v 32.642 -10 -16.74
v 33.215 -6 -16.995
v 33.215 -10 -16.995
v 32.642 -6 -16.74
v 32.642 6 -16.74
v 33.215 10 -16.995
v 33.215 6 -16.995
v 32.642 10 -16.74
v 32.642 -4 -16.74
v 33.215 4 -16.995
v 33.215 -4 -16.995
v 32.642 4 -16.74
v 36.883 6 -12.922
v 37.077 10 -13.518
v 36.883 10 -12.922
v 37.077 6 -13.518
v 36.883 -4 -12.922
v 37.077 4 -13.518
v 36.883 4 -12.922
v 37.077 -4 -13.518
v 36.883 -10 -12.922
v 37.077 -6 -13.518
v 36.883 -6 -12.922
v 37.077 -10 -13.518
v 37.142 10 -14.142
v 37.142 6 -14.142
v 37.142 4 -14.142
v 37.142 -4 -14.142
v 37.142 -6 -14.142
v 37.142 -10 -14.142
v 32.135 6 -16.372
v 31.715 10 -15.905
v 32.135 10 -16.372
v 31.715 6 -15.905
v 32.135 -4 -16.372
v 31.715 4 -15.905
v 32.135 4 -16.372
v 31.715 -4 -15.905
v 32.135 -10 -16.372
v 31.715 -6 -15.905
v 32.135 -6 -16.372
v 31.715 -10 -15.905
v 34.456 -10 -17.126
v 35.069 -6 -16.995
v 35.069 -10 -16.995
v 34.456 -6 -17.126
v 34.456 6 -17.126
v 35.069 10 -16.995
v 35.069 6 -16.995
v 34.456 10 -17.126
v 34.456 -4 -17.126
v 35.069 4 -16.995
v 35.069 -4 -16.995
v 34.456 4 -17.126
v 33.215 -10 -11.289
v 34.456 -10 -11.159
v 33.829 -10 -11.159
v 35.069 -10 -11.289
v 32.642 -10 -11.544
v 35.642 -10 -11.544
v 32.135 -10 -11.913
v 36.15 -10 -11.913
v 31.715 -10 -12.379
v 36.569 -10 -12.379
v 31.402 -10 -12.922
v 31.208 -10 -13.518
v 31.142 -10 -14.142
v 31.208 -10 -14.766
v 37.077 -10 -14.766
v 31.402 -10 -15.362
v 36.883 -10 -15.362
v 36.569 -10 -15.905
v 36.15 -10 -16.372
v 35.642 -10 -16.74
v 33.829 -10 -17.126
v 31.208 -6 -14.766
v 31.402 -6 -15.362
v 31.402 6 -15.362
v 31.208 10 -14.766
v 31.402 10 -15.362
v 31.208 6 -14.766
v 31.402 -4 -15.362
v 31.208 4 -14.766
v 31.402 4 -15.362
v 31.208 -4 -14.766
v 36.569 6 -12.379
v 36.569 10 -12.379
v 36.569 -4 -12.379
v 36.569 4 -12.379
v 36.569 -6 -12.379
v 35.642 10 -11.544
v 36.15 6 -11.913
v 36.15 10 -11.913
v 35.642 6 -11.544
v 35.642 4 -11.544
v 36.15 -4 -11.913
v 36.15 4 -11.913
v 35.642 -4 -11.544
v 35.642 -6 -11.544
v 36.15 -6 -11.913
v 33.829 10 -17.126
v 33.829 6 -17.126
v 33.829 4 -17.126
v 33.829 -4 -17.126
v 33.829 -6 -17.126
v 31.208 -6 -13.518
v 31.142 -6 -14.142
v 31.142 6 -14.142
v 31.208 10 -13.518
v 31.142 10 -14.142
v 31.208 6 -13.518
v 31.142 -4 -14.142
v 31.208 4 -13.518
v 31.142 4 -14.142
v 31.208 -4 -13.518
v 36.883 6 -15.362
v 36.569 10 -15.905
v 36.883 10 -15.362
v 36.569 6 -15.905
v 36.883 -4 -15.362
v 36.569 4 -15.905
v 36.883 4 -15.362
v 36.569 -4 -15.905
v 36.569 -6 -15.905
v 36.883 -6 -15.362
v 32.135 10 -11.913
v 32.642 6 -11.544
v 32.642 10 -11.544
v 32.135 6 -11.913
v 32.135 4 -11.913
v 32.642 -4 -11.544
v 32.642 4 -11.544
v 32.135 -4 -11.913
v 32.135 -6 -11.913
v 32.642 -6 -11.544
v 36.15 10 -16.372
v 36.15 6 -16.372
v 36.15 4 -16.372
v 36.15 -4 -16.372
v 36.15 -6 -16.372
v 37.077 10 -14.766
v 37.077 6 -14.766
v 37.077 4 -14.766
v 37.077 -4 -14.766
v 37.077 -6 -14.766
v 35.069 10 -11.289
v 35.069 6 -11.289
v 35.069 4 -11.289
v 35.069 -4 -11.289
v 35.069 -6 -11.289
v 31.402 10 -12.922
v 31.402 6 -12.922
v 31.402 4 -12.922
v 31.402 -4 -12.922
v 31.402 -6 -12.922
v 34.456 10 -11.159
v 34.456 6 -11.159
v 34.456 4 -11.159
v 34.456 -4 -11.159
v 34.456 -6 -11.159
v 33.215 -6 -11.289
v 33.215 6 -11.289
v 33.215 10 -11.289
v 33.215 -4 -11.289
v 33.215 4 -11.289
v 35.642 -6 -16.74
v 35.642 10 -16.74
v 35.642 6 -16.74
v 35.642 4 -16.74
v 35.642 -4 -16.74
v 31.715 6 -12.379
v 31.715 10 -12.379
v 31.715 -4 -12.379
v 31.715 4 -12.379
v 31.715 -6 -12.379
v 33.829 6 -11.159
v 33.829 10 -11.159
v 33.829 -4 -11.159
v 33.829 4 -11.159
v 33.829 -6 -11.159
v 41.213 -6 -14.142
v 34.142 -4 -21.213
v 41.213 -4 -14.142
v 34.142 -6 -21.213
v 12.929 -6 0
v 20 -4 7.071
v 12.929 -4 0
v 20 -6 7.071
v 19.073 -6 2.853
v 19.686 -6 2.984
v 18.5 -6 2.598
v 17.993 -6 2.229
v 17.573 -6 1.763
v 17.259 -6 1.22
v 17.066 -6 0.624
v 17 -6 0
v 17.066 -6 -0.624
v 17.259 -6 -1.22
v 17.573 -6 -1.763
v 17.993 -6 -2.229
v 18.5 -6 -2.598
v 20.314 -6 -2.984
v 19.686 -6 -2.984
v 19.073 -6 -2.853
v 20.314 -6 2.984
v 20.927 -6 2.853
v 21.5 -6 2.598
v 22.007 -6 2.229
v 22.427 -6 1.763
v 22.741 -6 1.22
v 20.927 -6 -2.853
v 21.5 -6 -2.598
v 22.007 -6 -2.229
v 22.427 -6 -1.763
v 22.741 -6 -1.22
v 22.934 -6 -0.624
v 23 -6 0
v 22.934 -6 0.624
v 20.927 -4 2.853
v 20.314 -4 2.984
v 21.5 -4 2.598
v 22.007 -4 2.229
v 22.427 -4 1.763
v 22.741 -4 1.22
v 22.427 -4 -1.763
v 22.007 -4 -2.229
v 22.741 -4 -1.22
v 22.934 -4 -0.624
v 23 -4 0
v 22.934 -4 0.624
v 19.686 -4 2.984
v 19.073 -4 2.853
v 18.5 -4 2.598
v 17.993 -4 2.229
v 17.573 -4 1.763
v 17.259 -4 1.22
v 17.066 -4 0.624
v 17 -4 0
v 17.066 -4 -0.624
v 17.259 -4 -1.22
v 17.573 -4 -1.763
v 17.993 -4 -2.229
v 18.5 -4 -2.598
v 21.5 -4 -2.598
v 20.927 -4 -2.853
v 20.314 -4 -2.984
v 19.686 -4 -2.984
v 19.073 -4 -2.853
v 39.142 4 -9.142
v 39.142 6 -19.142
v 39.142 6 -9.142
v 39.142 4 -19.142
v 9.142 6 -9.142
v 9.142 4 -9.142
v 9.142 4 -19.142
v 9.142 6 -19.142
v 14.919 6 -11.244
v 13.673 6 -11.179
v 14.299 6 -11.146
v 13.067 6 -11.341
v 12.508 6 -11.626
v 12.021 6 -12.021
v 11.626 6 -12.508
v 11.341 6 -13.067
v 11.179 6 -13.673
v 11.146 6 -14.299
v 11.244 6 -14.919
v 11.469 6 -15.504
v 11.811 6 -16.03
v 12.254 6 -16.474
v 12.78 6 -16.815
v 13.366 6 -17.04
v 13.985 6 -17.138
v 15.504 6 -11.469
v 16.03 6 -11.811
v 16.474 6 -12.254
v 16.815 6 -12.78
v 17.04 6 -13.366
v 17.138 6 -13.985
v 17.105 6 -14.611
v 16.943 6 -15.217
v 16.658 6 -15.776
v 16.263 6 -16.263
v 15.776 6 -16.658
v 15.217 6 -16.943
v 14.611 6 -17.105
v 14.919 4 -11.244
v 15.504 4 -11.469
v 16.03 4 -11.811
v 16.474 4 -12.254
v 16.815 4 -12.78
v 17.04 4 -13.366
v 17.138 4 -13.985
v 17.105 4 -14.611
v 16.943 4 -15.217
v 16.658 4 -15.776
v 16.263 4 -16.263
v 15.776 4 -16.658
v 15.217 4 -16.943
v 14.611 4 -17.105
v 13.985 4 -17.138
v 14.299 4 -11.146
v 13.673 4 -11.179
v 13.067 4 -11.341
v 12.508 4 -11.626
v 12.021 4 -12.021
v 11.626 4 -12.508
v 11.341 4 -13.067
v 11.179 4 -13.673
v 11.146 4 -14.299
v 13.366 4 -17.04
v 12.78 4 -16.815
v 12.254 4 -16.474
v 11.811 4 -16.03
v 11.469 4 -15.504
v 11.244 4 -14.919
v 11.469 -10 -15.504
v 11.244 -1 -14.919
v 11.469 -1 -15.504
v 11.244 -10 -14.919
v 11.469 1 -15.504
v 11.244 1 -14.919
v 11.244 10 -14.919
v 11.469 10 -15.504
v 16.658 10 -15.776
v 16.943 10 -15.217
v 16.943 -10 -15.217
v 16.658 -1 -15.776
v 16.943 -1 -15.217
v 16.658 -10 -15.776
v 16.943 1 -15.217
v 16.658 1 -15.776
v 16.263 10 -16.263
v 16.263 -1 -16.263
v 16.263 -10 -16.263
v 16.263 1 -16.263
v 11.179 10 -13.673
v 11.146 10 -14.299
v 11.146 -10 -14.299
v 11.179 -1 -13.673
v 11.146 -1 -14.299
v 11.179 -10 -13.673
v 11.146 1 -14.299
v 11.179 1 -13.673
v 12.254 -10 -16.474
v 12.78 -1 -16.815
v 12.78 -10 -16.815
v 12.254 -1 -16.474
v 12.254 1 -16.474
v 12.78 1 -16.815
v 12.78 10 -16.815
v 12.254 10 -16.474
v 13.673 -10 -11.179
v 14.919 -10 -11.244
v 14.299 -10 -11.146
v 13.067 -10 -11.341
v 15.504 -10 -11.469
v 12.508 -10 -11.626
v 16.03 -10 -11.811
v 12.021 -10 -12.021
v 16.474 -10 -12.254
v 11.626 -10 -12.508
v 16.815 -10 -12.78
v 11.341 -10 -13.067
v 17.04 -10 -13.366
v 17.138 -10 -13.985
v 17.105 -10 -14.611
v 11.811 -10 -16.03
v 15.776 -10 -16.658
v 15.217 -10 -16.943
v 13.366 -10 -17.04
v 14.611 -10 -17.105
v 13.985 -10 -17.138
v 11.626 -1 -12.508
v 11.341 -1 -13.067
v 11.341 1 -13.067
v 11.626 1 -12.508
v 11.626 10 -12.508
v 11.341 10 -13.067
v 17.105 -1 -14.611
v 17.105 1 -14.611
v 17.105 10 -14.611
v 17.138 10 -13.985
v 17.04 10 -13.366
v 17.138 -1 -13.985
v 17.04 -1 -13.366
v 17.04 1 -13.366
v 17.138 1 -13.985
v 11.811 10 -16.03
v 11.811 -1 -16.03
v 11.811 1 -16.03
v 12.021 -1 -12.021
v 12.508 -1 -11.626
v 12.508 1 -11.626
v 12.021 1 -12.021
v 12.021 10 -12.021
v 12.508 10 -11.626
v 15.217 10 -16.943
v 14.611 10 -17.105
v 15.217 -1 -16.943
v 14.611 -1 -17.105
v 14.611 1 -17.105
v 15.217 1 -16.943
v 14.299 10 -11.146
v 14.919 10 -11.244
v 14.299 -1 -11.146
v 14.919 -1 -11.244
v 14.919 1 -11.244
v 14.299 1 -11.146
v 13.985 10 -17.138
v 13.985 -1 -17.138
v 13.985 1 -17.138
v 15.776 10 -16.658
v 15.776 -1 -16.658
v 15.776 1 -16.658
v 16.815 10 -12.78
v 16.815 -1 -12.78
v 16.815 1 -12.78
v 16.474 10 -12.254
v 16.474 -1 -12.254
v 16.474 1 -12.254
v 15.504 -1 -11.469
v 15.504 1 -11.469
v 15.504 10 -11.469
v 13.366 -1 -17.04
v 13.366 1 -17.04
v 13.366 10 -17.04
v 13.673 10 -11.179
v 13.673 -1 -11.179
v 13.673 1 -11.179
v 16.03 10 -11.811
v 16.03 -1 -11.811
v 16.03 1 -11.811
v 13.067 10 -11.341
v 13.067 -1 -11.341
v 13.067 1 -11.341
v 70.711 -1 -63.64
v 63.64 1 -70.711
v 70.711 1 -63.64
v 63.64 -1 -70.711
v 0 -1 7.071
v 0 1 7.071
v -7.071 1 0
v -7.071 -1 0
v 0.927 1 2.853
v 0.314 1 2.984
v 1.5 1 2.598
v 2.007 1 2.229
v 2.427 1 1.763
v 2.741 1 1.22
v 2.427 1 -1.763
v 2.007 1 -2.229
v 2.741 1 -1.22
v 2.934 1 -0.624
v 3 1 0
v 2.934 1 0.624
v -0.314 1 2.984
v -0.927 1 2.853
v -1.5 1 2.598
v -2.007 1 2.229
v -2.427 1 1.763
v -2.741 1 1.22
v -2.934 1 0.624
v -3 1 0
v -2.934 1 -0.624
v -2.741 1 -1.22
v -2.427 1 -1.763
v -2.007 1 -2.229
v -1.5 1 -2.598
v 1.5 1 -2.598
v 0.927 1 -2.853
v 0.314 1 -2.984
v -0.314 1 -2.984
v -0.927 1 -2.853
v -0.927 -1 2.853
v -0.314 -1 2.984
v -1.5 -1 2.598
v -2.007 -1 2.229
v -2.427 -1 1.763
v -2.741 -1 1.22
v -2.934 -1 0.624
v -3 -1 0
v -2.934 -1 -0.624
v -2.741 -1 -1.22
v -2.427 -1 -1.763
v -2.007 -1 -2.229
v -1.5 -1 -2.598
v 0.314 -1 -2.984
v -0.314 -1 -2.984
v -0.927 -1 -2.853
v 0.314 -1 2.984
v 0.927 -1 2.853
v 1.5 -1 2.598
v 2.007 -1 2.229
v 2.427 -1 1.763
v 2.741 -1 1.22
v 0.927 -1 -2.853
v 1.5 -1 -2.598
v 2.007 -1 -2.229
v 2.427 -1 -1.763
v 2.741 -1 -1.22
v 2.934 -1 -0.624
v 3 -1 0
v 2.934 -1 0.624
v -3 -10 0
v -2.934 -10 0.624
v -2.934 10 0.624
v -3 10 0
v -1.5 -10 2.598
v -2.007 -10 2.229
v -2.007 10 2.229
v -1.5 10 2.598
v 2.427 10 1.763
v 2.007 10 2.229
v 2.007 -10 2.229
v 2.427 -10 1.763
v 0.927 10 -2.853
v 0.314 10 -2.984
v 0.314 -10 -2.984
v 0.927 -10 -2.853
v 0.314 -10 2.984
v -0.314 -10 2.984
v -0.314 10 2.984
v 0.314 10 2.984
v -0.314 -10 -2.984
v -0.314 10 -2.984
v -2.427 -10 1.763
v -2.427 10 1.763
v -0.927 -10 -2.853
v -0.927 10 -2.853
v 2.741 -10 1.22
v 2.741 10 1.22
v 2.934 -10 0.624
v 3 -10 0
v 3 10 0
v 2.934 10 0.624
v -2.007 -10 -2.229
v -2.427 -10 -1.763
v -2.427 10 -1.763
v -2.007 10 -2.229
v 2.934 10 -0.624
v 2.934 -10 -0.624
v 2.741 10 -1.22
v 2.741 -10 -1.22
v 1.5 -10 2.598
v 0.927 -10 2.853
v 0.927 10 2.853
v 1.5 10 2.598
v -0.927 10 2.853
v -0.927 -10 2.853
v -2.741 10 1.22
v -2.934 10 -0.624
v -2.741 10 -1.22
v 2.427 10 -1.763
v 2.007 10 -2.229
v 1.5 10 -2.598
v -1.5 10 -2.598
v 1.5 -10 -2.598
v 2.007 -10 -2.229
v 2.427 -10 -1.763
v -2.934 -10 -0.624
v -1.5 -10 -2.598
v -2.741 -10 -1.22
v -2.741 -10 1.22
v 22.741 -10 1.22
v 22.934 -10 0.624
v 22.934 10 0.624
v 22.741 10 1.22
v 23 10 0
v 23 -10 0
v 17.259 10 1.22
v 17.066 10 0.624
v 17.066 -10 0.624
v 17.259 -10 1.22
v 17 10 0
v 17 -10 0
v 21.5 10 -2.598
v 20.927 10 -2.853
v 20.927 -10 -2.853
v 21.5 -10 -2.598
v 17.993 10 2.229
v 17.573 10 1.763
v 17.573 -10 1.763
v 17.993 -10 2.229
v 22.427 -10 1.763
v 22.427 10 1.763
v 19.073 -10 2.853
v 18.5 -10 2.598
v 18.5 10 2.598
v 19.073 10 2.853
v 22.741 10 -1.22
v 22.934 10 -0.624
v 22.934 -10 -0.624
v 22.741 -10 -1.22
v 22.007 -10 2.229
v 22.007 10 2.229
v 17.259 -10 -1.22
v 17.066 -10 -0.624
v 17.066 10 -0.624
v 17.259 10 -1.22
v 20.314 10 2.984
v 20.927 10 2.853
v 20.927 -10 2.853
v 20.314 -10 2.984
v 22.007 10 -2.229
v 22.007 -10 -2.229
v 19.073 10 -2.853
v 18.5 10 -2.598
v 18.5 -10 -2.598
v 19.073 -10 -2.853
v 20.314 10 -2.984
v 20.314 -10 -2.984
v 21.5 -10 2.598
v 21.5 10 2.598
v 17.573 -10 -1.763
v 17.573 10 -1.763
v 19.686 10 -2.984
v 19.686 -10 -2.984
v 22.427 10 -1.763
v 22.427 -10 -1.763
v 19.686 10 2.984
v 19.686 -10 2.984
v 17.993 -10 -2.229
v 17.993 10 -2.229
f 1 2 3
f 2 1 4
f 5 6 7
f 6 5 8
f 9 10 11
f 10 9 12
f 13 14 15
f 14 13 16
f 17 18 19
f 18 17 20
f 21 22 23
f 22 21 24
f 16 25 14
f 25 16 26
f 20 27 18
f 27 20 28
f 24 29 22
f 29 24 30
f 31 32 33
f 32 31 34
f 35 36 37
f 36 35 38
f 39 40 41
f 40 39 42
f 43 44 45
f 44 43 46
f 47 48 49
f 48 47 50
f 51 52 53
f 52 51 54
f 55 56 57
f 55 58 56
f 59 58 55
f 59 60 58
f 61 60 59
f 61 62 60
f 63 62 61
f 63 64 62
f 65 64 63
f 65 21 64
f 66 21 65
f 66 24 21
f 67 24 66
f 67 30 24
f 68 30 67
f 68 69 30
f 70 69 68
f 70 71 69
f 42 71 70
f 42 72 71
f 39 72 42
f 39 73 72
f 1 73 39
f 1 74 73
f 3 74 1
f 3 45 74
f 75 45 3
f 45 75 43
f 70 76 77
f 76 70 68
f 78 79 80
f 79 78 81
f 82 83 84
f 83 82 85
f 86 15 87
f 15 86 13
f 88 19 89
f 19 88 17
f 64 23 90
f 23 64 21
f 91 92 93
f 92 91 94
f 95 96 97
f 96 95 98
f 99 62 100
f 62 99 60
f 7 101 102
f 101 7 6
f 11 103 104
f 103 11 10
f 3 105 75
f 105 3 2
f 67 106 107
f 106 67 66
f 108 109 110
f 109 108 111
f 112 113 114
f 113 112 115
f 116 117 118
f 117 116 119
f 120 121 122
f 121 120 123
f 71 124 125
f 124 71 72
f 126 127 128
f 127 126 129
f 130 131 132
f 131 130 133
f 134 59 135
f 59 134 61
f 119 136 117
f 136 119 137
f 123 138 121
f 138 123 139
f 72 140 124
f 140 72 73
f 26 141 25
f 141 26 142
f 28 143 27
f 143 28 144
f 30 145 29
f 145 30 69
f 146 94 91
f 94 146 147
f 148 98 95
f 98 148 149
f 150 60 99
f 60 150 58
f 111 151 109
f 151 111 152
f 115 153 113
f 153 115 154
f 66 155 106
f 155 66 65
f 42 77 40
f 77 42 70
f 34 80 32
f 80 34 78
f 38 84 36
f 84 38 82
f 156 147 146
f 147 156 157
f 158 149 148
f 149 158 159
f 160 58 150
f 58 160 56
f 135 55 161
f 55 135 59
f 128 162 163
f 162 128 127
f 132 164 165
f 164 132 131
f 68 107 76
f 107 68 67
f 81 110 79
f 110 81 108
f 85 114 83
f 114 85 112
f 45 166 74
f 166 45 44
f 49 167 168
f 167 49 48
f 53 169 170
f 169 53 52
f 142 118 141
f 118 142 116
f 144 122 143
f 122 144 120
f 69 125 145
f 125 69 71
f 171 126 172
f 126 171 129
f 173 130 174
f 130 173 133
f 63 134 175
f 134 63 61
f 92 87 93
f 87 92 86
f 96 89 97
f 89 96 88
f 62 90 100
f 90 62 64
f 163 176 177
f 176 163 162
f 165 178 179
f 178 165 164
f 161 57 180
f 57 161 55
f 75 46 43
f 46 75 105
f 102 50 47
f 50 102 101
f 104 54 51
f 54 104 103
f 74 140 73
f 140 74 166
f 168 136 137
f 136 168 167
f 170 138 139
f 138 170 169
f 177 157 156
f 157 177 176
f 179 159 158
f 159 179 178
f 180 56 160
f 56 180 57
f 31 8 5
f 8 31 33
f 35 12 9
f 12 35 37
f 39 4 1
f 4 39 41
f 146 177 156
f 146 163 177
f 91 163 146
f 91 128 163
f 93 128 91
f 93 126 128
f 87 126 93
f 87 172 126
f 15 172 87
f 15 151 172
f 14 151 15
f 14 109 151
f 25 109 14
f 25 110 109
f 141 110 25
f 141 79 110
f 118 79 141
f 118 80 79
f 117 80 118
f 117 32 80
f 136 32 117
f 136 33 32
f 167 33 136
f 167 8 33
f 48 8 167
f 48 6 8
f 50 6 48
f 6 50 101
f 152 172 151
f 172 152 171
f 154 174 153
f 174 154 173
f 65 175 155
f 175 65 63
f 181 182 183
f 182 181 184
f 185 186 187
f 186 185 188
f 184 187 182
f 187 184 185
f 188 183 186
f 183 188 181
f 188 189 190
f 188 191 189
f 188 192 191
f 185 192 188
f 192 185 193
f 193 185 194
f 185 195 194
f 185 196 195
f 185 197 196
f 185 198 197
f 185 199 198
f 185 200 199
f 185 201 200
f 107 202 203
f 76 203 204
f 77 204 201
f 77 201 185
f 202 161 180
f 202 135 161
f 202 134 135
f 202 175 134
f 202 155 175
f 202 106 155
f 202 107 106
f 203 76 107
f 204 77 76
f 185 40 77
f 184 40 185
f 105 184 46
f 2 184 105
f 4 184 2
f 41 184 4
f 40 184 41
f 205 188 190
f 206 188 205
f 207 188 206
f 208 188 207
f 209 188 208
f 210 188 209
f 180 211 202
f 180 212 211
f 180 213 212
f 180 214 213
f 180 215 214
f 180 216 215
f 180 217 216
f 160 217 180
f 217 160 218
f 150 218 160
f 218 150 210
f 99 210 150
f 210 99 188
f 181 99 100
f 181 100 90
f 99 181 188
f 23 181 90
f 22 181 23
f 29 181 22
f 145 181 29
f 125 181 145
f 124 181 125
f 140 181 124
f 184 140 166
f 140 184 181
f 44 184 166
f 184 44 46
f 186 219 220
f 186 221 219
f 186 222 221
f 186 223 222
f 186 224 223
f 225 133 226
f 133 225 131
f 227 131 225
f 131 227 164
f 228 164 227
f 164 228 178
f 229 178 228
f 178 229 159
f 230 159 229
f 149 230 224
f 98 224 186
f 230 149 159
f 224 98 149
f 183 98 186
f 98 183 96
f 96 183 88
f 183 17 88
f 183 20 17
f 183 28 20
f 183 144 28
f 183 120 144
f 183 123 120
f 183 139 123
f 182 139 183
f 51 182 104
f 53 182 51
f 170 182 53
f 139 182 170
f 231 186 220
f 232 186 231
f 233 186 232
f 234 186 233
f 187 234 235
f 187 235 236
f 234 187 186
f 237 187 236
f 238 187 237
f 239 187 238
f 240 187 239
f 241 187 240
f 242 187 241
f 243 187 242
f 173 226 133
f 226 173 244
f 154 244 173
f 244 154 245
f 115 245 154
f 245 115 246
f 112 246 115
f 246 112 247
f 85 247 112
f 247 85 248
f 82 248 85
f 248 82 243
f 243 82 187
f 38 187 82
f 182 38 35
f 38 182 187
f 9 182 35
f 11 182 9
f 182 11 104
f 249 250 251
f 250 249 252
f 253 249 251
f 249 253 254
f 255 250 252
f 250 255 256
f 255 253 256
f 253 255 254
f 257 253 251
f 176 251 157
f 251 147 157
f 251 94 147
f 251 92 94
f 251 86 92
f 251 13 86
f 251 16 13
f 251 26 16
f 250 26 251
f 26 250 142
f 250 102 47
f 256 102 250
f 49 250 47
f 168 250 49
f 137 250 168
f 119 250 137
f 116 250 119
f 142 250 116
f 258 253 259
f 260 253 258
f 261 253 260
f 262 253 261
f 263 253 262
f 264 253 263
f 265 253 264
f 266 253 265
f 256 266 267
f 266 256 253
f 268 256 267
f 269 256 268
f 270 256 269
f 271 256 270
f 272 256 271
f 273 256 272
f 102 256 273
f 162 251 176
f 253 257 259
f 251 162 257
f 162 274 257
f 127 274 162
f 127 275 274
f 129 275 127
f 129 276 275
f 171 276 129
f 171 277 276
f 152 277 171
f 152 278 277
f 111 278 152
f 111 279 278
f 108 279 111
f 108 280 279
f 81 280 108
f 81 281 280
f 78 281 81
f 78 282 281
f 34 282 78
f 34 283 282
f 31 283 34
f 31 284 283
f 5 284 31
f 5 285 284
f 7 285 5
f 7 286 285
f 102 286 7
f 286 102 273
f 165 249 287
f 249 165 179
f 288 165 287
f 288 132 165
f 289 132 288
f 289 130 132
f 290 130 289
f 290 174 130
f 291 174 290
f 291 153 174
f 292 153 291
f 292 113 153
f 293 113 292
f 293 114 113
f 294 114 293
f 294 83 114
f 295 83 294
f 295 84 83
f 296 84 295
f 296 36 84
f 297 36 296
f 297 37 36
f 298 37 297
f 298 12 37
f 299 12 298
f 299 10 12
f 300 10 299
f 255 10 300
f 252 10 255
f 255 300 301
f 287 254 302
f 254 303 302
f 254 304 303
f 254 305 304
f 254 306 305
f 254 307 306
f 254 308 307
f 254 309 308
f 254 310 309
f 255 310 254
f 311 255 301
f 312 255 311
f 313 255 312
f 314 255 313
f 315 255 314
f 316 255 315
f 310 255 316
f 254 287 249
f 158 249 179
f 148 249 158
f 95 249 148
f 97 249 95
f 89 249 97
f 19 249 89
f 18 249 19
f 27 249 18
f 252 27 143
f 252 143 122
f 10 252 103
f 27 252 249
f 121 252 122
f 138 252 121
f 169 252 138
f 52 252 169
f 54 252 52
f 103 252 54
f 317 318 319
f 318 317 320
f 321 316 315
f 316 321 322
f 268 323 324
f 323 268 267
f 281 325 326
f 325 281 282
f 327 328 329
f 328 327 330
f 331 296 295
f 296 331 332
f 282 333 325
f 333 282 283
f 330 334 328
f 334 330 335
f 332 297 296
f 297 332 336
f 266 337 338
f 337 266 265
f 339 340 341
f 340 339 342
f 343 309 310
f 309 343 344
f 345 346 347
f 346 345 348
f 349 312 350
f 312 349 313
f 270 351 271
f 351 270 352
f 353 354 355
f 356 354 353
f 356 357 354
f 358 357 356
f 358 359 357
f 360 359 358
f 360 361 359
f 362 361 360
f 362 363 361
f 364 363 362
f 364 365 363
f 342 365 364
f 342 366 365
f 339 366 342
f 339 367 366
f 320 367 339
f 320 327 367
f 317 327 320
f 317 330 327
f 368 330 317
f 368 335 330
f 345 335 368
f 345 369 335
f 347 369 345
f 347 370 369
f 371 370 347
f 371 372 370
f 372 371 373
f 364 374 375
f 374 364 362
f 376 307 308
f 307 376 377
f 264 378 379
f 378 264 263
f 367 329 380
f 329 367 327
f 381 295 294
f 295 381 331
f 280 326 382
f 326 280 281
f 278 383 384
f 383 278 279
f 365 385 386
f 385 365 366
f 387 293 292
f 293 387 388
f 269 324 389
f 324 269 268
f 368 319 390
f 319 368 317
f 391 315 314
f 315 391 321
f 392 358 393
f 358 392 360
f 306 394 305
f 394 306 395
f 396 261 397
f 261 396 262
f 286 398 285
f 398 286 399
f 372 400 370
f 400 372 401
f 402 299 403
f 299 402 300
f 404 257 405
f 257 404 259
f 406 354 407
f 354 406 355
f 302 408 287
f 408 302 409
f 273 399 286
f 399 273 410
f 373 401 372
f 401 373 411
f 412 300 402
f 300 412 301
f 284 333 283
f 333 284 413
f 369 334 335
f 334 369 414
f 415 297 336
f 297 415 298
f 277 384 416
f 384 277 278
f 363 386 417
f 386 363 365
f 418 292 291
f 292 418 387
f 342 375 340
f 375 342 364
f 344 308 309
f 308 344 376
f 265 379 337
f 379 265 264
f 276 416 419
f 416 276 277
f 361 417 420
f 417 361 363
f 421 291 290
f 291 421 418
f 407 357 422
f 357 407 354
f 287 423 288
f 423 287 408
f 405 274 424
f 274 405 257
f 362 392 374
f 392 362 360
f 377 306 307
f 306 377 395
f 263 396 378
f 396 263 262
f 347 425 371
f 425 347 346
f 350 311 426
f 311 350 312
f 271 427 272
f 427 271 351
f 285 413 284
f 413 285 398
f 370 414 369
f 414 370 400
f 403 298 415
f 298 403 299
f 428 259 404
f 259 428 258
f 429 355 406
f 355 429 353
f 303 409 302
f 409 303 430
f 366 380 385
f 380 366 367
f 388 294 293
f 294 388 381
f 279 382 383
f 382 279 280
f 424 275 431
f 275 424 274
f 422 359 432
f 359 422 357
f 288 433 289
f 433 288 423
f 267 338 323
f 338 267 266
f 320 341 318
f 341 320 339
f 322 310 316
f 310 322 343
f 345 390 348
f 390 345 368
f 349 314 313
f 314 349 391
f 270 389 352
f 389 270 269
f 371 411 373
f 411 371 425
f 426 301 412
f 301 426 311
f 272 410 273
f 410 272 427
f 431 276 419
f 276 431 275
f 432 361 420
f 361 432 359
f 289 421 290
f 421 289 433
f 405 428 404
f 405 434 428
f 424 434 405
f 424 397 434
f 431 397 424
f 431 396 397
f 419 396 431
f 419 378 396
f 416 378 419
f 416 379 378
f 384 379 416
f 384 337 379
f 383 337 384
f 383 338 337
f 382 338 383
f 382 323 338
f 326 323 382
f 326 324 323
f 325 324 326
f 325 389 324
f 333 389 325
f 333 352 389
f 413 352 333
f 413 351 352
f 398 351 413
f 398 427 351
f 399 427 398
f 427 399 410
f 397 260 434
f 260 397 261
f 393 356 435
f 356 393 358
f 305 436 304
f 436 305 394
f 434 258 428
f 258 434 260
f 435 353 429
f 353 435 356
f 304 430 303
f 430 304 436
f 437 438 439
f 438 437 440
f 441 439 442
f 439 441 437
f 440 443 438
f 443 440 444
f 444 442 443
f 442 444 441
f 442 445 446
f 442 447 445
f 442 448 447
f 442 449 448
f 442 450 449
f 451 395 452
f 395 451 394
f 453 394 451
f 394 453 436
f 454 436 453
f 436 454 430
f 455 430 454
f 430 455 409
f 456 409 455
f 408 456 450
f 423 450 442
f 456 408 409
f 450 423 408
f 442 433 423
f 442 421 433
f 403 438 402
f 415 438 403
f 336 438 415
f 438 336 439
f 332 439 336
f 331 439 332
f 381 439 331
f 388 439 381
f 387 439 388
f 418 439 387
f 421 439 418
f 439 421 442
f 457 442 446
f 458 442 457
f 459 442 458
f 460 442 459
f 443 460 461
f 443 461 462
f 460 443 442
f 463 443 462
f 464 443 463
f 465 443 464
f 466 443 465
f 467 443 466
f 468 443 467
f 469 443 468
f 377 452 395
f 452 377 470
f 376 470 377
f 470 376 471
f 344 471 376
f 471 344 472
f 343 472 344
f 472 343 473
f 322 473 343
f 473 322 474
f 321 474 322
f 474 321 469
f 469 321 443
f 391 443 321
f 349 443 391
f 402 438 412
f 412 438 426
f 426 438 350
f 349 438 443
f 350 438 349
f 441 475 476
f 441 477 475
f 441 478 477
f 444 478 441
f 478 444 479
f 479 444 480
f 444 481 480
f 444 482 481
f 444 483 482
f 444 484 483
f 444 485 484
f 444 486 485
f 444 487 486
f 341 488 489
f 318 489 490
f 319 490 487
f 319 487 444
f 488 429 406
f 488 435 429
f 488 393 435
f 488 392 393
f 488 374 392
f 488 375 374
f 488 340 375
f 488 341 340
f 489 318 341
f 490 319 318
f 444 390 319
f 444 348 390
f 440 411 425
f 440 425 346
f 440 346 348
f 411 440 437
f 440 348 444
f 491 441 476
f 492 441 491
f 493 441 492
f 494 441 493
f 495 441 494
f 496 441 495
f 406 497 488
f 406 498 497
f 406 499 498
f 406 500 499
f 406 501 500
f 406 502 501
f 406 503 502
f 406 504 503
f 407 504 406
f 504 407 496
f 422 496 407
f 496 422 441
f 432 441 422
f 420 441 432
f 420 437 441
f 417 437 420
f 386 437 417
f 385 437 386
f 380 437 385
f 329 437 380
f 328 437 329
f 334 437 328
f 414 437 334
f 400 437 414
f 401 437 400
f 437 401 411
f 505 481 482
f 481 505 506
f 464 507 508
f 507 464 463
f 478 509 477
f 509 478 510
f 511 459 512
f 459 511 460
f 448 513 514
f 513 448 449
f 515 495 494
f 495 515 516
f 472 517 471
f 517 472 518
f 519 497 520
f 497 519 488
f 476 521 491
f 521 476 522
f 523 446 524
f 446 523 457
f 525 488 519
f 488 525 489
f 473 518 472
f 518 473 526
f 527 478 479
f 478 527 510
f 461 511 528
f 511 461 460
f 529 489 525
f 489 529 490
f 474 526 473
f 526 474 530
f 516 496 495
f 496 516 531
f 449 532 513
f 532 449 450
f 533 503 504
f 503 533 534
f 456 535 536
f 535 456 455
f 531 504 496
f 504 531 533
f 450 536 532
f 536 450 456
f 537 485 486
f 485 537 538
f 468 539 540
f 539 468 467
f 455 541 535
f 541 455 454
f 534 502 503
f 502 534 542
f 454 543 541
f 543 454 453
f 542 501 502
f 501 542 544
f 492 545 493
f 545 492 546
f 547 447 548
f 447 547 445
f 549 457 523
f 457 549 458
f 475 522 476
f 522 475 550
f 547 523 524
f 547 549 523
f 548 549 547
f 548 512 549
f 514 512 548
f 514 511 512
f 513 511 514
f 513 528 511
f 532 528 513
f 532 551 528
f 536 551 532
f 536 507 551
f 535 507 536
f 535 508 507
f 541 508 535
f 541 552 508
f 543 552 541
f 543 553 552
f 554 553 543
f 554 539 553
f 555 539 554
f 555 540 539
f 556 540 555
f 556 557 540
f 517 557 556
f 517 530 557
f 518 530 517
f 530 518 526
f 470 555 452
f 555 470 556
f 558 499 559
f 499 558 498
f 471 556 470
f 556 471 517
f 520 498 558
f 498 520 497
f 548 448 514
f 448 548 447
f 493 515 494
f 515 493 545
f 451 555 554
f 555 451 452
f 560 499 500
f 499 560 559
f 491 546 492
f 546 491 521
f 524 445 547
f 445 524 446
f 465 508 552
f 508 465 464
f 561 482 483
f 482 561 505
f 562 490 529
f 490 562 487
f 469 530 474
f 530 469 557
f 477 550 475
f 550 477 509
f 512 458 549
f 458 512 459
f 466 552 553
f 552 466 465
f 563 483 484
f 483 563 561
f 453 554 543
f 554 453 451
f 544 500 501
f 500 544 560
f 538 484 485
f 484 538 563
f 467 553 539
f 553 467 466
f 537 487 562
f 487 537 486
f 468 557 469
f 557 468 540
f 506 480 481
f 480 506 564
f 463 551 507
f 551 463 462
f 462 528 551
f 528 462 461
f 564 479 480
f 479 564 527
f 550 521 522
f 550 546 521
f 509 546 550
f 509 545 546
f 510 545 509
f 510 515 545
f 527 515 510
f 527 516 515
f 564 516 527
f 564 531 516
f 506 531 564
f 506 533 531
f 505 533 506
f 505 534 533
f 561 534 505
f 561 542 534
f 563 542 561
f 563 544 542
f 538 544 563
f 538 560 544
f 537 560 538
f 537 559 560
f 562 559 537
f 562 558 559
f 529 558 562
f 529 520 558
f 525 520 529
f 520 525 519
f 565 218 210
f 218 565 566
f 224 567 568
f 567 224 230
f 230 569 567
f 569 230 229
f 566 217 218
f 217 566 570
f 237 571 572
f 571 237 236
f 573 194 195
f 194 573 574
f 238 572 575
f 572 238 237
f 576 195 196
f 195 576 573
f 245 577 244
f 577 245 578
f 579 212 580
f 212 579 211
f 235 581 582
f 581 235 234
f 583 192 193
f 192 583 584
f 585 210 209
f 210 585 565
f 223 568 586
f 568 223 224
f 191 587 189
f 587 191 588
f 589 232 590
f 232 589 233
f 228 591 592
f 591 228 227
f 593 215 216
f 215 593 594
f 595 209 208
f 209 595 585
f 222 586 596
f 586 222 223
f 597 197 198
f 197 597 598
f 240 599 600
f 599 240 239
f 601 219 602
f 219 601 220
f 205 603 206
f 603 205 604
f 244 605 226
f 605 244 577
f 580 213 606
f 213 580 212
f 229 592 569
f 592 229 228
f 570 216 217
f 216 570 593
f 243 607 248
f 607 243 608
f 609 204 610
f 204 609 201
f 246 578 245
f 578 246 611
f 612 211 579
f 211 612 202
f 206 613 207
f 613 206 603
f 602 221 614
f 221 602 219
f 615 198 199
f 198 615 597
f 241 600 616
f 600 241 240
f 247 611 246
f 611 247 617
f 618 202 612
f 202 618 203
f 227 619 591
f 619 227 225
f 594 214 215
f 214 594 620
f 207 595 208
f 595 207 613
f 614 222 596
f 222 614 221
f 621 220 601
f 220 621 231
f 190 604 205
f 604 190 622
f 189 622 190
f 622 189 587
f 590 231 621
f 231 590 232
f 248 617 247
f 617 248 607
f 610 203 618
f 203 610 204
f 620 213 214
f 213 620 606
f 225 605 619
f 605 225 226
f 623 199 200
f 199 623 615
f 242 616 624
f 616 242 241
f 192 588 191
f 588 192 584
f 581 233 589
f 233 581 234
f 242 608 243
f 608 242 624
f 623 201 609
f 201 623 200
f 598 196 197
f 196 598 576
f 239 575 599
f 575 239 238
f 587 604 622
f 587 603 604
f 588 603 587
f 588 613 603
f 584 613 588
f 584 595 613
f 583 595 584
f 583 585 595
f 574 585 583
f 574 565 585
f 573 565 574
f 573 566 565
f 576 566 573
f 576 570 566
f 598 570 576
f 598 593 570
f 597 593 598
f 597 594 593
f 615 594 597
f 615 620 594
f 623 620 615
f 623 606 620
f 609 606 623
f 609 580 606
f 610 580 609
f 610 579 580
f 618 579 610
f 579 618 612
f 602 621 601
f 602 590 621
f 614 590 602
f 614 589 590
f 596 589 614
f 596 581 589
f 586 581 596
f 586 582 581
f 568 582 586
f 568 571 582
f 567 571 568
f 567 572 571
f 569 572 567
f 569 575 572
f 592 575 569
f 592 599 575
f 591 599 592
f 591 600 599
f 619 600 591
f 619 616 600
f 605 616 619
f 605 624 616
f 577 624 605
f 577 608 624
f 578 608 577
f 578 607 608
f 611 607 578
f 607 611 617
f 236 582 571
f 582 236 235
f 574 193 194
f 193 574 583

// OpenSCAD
$fs=0.1;

alpha=45;
beta=45;
gamma=135;

a = 20;
b = 20;
c = 20;
d = 20;

// a*cos(-alpha) + b*cos(beta-alpha) + c*cos(gamma+beta-alpha) = d
// a*sin(-alpha) + b*sin(beta-alpha) + c*sin(gamma+beta-alpha) = 0

rotate([90, 0, 0])
	cylinder(h = 20, r = 3, center=true);

translate([d, 0, 0]) rotate([90, 0, 0])
	cylinder(h = 20, r = 3, center=true);

rotate([0, alpha, 0]) {
	translate([45, 0, 0])
		cube([100, 2, 10], center=true);
	translate([a, 0, 0]) {
		rotate([90, 0, 0])
			cylinder(h = 20, r = 3, center=true);
		rotate([0, -beta, 0]) {
			translate([b/2, 5, 0])
				cube([b + 10, 2, 10], center=true);
			translate([b, 0, 0]) {
				rotate([90, 0, 0])
					cylinder(h = 20, r = 3, center=true);
				rotate([0, -gamma, 0])
					translate([c/2, -5, 0])
						cube([c + 10, 2, 10], center=true);
			}
		}
	}
}
